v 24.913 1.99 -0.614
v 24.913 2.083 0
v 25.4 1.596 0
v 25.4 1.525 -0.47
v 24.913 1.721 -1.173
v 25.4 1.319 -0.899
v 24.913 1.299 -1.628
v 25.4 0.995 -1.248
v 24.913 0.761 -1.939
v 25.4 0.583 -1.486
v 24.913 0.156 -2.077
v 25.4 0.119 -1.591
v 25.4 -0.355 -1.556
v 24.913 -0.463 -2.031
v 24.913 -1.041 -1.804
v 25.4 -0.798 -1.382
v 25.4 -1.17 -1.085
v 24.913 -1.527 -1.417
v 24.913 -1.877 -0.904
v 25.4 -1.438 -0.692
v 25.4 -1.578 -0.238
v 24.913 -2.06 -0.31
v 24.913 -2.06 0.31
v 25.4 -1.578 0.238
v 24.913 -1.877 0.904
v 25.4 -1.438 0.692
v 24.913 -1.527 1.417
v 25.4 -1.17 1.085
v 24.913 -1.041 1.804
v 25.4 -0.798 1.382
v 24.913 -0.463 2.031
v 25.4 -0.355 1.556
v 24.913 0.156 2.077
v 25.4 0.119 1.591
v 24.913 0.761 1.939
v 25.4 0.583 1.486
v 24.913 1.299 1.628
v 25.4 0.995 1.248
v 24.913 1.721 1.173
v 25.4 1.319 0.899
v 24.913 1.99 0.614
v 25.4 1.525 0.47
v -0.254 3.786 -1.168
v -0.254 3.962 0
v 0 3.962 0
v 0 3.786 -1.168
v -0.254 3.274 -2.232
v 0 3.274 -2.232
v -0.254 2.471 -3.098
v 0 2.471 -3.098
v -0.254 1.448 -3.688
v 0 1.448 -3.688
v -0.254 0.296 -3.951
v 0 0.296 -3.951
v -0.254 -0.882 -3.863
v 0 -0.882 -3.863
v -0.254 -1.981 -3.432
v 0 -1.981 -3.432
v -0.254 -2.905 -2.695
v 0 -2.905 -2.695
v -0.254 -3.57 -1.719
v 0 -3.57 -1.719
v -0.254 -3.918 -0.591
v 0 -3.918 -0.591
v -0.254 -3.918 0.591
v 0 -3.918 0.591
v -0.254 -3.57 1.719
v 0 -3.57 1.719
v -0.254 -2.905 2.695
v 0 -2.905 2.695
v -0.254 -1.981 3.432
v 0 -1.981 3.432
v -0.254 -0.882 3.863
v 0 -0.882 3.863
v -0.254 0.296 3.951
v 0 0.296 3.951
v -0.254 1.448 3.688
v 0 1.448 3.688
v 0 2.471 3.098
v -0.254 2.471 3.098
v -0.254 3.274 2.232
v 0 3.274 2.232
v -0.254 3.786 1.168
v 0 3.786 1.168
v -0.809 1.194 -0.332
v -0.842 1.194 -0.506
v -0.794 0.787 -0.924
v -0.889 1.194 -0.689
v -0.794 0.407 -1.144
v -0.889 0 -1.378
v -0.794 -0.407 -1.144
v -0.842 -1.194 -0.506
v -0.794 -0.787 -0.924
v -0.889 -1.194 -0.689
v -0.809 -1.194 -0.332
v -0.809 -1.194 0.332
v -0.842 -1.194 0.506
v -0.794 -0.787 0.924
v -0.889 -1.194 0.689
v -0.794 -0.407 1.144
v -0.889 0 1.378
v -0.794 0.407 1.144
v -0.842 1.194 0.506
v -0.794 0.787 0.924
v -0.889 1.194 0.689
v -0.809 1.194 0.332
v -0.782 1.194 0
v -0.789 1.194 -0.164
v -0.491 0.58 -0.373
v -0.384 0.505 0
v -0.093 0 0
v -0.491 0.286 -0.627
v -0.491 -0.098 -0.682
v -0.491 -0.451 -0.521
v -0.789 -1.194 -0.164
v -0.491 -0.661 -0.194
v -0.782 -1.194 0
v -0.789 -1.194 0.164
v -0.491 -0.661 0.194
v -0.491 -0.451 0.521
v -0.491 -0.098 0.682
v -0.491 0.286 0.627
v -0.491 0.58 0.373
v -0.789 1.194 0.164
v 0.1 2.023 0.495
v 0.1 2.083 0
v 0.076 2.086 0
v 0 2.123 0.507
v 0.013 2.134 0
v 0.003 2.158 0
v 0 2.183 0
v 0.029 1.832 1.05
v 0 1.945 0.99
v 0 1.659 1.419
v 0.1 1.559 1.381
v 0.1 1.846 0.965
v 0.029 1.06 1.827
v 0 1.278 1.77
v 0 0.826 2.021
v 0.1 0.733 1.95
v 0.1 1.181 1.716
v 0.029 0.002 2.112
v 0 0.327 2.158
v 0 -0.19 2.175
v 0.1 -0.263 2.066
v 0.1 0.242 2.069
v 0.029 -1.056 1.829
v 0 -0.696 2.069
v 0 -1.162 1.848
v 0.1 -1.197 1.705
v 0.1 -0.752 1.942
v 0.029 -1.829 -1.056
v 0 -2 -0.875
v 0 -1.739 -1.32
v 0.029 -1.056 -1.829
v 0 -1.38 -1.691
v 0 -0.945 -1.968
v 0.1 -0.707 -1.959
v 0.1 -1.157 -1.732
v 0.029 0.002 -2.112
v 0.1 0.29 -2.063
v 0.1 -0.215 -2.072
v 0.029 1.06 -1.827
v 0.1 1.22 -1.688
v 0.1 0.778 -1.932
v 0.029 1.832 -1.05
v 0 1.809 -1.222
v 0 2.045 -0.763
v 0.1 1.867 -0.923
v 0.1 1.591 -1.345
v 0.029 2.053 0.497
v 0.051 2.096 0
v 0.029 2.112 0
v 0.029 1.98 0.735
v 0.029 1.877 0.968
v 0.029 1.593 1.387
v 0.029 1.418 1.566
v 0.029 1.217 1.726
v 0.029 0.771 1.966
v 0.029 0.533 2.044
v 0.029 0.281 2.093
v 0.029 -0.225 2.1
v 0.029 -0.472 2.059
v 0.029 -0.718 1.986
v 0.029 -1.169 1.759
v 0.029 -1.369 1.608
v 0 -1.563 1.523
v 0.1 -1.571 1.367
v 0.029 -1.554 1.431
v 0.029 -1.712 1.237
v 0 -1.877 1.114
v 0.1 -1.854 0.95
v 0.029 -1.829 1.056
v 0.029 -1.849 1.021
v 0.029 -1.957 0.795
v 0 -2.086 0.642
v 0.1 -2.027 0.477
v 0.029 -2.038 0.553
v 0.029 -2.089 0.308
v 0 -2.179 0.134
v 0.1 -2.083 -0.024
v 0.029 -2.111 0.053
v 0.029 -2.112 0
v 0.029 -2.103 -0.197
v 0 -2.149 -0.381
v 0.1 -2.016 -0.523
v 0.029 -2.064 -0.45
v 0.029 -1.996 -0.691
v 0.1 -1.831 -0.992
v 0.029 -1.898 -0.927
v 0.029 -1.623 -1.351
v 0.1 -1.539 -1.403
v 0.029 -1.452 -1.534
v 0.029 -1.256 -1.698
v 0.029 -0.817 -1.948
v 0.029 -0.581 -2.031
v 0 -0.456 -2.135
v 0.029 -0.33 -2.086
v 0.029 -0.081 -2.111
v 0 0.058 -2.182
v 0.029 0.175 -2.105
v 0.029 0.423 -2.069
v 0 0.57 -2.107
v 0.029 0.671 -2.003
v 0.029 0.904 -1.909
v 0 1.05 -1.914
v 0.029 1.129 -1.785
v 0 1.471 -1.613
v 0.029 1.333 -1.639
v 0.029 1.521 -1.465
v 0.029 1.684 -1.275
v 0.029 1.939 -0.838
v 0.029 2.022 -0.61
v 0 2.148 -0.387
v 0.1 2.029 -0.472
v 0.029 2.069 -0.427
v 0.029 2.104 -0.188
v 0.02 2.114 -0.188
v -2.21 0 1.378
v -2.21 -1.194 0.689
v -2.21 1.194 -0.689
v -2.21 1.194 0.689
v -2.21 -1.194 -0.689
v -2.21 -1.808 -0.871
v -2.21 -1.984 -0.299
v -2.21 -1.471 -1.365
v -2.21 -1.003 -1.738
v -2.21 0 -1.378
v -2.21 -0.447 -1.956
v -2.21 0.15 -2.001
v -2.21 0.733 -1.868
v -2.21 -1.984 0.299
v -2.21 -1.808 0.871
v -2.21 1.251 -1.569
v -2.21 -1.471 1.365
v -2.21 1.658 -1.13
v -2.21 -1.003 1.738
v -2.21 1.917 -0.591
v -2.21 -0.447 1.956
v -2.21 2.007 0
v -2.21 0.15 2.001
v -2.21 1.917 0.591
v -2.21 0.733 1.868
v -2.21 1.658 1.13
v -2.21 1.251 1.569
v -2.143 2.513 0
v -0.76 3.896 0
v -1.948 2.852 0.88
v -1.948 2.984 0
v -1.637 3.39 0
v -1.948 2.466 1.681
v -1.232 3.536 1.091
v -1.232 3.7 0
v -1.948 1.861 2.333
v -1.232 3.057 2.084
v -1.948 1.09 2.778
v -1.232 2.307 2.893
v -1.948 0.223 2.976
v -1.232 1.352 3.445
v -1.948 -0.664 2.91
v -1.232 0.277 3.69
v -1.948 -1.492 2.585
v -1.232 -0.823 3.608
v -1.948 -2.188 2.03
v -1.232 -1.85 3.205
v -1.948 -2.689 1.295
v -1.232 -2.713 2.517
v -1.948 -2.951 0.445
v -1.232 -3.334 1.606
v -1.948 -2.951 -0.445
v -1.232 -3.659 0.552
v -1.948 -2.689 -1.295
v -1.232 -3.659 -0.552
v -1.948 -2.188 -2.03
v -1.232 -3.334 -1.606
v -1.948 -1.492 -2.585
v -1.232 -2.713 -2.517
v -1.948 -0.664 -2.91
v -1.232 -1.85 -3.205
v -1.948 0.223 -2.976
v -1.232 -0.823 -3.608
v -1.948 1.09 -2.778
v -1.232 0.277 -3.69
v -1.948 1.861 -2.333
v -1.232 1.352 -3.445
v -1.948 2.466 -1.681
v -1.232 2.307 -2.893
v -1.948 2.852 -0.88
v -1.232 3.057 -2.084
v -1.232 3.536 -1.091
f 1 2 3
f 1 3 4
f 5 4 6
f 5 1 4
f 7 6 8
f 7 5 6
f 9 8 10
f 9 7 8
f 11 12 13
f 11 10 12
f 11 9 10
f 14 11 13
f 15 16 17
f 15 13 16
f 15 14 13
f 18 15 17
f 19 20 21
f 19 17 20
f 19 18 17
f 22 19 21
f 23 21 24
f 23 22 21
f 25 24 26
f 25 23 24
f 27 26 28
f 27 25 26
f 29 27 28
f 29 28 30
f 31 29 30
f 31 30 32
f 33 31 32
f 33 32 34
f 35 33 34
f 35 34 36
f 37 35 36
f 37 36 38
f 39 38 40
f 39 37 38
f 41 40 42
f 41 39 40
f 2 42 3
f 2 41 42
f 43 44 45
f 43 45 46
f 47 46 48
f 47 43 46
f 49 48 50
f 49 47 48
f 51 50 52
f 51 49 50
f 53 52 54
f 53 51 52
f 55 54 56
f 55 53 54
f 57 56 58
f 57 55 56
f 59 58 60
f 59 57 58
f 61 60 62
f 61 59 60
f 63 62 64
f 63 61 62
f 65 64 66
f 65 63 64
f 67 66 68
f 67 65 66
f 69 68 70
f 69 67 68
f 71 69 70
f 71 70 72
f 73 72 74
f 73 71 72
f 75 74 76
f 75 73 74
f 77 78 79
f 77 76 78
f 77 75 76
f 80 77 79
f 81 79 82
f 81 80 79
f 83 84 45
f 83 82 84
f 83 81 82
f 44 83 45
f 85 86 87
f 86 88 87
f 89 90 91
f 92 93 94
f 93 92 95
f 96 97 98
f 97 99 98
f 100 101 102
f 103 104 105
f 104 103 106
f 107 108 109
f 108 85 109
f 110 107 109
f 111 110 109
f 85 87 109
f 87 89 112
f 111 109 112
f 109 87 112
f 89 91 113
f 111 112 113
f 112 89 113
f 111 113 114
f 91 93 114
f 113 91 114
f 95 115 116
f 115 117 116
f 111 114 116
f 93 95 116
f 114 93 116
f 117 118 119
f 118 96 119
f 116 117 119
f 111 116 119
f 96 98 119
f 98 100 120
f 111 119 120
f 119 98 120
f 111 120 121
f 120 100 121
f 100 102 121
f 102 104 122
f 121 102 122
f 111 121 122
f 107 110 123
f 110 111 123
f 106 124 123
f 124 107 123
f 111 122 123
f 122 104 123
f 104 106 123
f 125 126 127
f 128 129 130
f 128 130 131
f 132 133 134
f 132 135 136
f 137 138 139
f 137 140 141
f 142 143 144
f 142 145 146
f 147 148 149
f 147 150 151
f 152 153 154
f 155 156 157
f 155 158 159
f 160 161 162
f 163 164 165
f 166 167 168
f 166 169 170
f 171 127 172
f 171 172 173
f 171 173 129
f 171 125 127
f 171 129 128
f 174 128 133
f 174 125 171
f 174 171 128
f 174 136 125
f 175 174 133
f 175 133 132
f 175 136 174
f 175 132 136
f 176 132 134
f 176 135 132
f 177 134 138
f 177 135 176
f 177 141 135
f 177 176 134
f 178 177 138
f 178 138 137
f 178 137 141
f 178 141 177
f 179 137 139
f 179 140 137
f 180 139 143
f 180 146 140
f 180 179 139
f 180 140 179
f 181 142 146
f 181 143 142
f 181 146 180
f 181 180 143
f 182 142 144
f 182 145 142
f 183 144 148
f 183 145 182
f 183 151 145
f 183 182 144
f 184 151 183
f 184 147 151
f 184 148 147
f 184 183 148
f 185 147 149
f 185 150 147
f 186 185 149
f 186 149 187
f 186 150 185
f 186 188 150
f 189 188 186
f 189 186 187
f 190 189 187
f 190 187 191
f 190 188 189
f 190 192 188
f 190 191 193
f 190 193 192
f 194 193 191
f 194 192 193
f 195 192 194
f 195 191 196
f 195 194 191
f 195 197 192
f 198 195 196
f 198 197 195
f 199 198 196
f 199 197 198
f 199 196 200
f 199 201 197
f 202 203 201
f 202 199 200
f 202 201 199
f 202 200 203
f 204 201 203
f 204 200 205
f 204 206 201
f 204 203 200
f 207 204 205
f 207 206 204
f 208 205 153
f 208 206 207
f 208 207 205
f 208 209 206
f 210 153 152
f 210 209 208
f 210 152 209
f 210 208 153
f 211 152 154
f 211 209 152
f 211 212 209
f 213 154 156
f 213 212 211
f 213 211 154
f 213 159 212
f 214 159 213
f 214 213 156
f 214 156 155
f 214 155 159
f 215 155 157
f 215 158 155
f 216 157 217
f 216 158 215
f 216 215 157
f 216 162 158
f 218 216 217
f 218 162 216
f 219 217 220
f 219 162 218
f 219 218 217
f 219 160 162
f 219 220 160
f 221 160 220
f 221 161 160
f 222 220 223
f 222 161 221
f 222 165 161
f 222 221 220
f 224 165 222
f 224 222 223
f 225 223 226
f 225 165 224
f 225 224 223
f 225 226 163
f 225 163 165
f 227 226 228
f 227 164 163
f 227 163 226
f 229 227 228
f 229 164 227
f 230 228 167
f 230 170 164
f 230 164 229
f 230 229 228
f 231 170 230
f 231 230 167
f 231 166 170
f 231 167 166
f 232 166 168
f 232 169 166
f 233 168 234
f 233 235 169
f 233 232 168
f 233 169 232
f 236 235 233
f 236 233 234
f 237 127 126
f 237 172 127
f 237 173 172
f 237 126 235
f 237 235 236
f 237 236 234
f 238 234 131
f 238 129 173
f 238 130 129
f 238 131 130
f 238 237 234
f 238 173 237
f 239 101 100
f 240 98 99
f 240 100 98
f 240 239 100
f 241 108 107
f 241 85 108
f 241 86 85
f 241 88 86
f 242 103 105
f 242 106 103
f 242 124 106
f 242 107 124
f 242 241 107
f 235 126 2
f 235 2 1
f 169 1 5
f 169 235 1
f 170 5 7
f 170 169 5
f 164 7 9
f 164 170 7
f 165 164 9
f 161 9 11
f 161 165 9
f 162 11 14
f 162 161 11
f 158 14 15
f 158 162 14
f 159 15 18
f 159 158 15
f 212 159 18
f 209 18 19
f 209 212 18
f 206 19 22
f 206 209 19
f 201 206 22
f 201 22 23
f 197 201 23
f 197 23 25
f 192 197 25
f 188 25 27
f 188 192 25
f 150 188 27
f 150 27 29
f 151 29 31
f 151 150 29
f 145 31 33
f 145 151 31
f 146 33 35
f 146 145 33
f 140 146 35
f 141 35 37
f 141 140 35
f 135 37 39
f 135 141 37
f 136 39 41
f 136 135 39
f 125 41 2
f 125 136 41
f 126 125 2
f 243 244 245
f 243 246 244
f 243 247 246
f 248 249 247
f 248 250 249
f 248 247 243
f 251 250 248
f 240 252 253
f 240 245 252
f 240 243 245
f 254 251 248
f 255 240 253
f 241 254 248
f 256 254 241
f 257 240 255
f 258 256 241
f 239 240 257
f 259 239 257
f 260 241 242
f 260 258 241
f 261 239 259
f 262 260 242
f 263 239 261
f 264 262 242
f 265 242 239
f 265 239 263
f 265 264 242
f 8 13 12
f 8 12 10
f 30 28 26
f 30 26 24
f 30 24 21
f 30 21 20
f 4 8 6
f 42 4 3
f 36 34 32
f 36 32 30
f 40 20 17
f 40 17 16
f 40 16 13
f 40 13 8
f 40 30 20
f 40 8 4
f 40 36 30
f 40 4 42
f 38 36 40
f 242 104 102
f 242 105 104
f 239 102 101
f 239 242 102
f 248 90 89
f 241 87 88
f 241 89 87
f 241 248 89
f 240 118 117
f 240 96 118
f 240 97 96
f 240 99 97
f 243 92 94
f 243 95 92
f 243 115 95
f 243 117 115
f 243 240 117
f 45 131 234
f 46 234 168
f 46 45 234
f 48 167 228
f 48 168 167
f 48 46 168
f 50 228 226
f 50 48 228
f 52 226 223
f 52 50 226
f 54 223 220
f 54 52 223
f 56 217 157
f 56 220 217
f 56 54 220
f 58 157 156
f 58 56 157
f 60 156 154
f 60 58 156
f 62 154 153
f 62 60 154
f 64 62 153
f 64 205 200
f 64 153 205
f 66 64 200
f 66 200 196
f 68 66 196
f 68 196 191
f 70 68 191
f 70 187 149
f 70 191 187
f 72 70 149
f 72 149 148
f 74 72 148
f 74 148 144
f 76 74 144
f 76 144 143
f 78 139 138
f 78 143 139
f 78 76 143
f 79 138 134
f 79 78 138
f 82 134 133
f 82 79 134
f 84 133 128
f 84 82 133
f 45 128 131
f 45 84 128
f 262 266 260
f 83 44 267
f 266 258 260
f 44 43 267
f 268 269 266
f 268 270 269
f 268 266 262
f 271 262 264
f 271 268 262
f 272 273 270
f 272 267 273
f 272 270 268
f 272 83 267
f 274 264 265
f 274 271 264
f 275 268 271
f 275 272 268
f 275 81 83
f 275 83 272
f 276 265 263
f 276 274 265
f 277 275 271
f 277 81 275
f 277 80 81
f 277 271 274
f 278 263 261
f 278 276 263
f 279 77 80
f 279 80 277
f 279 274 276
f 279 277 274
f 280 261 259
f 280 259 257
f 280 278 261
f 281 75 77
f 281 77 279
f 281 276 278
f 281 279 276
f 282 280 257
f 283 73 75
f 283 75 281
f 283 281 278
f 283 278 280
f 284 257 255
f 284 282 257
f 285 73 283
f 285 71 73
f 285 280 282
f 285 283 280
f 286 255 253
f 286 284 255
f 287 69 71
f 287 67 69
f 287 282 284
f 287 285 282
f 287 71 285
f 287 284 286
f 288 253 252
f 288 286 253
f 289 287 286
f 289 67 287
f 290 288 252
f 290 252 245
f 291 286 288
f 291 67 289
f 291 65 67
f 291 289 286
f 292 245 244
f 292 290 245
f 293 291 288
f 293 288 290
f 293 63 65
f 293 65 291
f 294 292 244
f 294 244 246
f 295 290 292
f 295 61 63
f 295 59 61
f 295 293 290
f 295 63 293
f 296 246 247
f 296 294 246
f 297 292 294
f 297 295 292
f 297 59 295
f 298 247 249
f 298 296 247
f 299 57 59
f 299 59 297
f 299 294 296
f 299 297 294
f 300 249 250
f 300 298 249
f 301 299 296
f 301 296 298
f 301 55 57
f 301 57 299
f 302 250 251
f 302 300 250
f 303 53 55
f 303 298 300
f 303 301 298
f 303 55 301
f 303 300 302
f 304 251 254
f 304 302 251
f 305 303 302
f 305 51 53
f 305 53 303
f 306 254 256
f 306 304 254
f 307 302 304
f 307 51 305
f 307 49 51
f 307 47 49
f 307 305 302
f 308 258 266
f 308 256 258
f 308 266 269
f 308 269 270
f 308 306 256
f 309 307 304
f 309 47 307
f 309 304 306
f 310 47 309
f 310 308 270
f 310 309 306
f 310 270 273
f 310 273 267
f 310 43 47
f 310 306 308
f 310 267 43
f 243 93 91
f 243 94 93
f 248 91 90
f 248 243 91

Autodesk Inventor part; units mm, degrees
ref_plane "YZ Plane" through (0, 0, 0) normal (1, 0, 0) x (0, 1, 0)
ref_plane "XZ Plane" through (0, 0, 0) normal (0, 1, 0) x (-1, 0, 0)
sketch "Sketch1" plane through (0, 0, 0) normal (0, 0, 1) x (1, 0, 0)
  line L0 (-0.0931, 0) -> (25.4, 0)
  line L1 (25.4, 0) -> (25.4, 2.0828)
  line L2 (25.4, 2.0828) -> (1.5902, 2.0828)
  line L3 (1.5902, 2.0828) -> (0.0001, 2.0828)
  line L4 (0.0001, 2.0828) -> (0, 2.0828)
  line L5 (0, 2.0828) -> (0, 3.9624)
  line L6 (0, 3.9624) -> (-2.2098, 3.9624)
  line L7 (-2.2098, 3.9624) -> (-2.2098, 1.3785)
  line L8 (-2.2098, 1.3785) -> (-0.889, 1.3785)
  line L9 (-0.889, 1.3785) -> (-0.0931, 0)
  line L10 (-7.7318, 0) -> (30.922, 0) projected
  line L11 (0, -0.7925) -> (0, 4.7549) projected
  line L12 (1.5902, 2.0828) -> (0, 2.0828) construction
  dimension "d1" = 23.8098
  dimension "d2" = 1.5901
  dimension "d3" = 2.2098
  dimension "d4" = 1.3208
  dimension "d5" = 60
  dimension "d6" = 4.1656
  dimension "d7" = 4.1656
  dimension "d8" = 2.757
  dimension "d9" = 7.9248
  dimension "d26" = 25.4
revolve "Body" add sketch "Sketch1" angle 360 about axis through (-0.0931, 0, 0) along (1, 0, 0)
sketch "Sketch2" plane through (-2.2098, 0, 0) normal (-1, 0, 0) x (0, 0, 1)
  circle A0 centre (0, 0) radius 1.3785 projected
  line L0 (0, -5.5474) -> (0, 5.5474) projected
  line L1 (-5.5474, 0) -> (5.5474, 0) projected
  line L2 (1.3785, 0) -> (0.6892, -1.1938)
  line L3 (0.6892, -1.1938) -> (-0.6892, -1.1938)
  line L4 (-0.6892, -1.1938) -> (-1.3785, 0)
  line L5 (-1.3785, 0) -> (-0.6892, 1.1938)
  line L6 (-0.6892, 1.1938) -> (0.6892, 1.1938)
  line L7 (0.6892, 1.1938) -> (1.3785, 0)
extrude "Slot" add sketch "Sketch2" against normal up to next contours L7 A0 | A0 L2 | L6 L0 A0 | A0 L0 L3 | L0 L6 A0 | A0 L3 L0 | L4 A0 | A0 L5
fillet "Fillet1" radius 1.9558 1 edges at (-2.2098, -3.9624, 0)
thread "Thread" size "8-32 UNC" class "2A" standard "ANSI Unified Screw Threads" length 23.8098
chamfer "Chamfer1" distance 0.4869 distance2 0.4869 1 edges at (25.4, -2.0828, 0) measured on face at (25.4, -0.0273, 0.4604)
ref_plane "Work Plane1" through (29, 0, 0) normal (0, -1, 0) x (1, 0, 0)
fillet "Fillet2" radius 0.1 1 edges at (0.0001, -2.0828, 0)
equation "\"d1\" = GEL"
equation "\"d3\" = KOH"
equation "\"d4\" = INTI"
equation "\"d6\" = GD"
equation "\"d7\" = BDM"
equation "\"d8\" = 1.1547 * SW"
equation "\"d9\" = KOD"
equation "\"d26\" = NLG"
equation "\"d30\" = R"
equation "\"d17\" = RR"
equation "\"d13\" = GEL"
equation "\"d15\" = -0.5 * SPD + 0.5 * GD"
equation "\"d16\" = GUL"
equation "\"GD\" = NND"
equation "\"NLG\" = 25.4"
equation "\"GEL\" = 23.80976"
equation "\"KOD\" = 7.9248"
equation "\"KOH\" = 2.2098"
equation "\"INTI\" = 1.3208"
equation "\"GAL\" = 1.59004"
equation "\"GUL\" = 0.48692"
equation "\"BDM\" = NND"
equation "\"SW\" = 2.3876"
equation "\"RR\" = 1.9558"
equation "\"SPD\" = 3.19176"
equation "\"R\" = 0.1"
equation "\"TOA\" = 30deg"
equation "\"GD1\" = SPD"
equation "\"THREADDIA\" = 4.1656"
equation "\"KOH1\" = 0.381"
equation "\"NND\" = 4.1656"
equation "\"E0\" = 2.75768"
properties part number "ANSI B18.3 - 8 - 32 x 1" material "Steel, Mild"
